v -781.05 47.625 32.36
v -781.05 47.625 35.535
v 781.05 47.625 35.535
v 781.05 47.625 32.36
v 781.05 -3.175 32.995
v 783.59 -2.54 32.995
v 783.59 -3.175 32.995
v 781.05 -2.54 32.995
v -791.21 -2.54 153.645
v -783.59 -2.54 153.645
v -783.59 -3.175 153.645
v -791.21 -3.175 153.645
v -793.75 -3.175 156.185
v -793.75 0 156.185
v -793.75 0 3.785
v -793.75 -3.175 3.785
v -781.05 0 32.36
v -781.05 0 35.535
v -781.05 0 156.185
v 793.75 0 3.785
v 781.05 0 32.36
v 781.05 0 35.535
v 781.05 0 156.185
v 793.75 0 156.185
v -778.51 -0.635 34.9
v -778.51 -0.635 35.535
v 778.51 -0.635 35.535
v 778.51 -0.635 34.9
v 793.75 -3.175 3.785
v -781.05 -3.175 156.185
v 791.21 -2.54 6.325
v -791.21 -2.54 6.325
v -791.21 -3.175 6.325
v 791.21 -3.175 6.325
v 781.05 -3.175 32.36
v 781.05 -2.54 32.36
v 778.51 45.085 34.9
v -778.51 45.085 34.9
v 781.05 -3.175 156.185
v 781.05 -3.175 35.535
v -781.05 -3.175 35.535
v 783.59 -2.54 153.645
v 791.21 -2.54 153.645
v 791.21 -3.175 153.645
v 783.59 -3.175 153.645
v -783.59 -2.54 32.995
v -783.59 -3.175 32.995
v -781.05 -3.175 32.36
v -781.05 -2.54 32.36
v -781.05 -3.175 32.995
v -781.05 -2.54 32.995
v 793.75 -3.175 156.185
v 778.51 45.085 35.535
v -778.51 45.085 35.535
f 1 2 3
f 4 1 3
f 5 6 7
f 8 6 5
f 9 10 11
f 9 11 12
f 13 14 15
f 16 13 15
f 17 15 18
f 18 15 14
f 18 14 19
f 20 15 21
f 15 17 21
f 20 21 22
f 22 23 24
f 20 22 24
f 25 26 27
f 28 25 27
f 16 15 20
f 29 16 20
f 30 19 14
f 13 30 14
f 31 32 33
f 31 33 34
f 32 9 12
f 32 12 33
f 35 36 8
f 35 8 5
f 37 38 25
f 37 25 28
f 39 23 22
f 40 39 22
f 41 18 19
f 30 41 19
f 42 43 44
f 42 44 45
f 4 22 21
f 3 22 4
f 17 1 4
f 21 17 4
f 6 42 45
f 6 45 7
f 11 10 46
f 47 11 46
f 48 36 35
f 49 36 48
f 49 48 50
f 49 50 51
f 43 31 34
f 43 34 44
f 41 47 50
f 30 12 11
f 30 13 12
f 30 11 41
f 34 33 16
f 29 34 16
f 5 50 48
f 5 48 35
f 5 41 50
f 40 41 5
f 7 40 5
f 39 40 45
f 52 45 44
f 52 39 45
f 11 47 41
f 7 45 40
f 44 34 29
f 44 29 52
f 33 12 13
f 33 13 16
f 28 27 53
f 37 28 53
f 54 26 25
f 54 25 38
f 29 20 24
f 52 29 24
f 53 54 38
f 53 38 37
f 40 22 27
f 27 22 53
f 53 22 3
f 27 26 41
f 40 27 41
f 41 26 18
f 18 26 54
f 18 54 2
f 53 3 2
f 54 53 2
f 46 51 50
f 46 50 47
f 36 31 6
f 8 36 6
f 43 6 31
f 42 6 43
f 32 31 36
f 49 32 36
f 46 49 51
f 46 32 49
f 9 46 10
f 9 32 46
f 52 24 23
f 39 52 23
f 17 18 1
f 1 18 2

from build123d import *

# Parameters (mm, degrees)
F1_DEPTH     = 3.175
F3_W         = 1562.1
F3_H         = 50.8
F4_DEPTH     = 3.175
F5_T         = 2.54
F5_T3_DEPTH  = 8.255
F5_T5_DEPTH  = 1567.18
F6_T         = 2.54
F6_T3_DEPTH  = 8.255
F6_T5_DEPTH  = 8.255
F6_T7_DEPTH  = 1567.18
F6_T9_DEPTH  = 5.715
F6_T11_DEPTH = 50.165
F6_T13_DEPTH = 5.715
F6_T15_DEPTH = 1562.1


# Not quite as in the source:
# - a shell that OpenCascade refuses in one call is made with other operations: the cavity is built on its own and cut out


with BuildPart() as f1:
    # F0 (on Front) → F1 (new body)
    with BuildSketch(Plane.XZ):
        Polygon((-781.05, 156.1854919385), (-793.75, 156.1854919385), (-793.75, 3.7854919385), (793.75, 3.7854919385), (793.75, 156.1854919385), (781.05, 156.1854919385), (781.05, 35.5354919385), (-781.05, 35.5354919385), align=None)
    extrude(amount=F1_DEPTH)

    # F3 (on face) → F4 (join)
    with BuildSketch(Plane.XY.offset(35.5354919385)):
        with Locations((0, 22.225)):
            Rectangle(F3_W, F3_H)
    extrude(amount=-F4_DEPTH)

    # F5: shell of thickness 2.54, made by hand


with BuildPart() as f5_core1:
    # F5_t2: copy of F1
    add(f1.part)

    # the walls: a layer under each face that stays
    f5_faces = [f5_core1.faces().sort_by_distance(p)[0] for p in [
        (-781.05, -1.5875, 95.8604919385),
        (-787.4, -1.5875, 156.1854919385),
        (-529.1666666667, 0, 29.1854919385),
        (-529.1666666667, -3.175, 29.1854919385),
        (781.05, -1.5875, 95.8604919385),
        (-793.75, -1.5875, 79.9854919385),
        (-781.05, 23.8125, 33.9479919385),
        (0, 23.8125, 32.3604919385),
        (781.05, 23.8125, 33.9479919385),
        (787.4, -1.5875, 156.1854919385),
        (793.75, -1.5875, 79.9854919385),
        (0, -1.5875, 3.7854919385),
        (0, 47.625, 33.9479919385),
    ]]
    thicken(f5_faces, amount=-F5_T, mode=Mode.SUBTRACT)

    # F5_s4 → F5_t3 (cut)
    with BuildSketch(Plane.XY.offset(29.8204919385)):
        Polygon((-781.0754, 0.0254), (-781.05, -2.54), (-778.51, -2.54), (-778.51, 0), align=None)
        Polygon((781.0754, 0.0254), (781.05, -2.54), (778.51, -2.54), (778.51, 0), align=None)
    extrude(amount=F5_T3_DEPTH, mode=Mode.SUBTRACT)

    # F5_s6 → F5_t5 (cut)
    with BuildSketch(Plane.YZ.offset(-783.59)):
        Polygon((0.0254, 32.3350919385), (-2.54, 32.3604919385), (-2.54, 34.9004919385), (0, 34.9004919385), align=None)
    extrude(amount=F5_T5_DEPTH, mode=Mode.SUBTRACT)


with BuildPart() as f1_1:
    add(f1.part)

    # what is left inside the walls is the cavity
    f5_cavity = [f5_core1.part.solids().sort_by_distance(p)[0] for p in [
        (0, 14.605, 34.925892),
    ]]
    add(f5_cavity, mode=Mode.SUBTRACT)

    # F6: shell of thickness 2.54, made by hand


with BuildPart() as f6_core1:
    # F6_t2: copy of F1
    add(f1_1.part)

    # the walls: a layer under each face that stays
    f6_faces = [f6_core1.faces().sort_by_distance(p)[0] for p in [
        (-781.05, -1.5875, 95.8604919385),
        (728.98, -1.4816666667, 35.5354919385),
        (-787.4, -1.5875, 156.1854919385),
        (-529.1666666667, 0, 29.1854919385),
        (781.05, -1.5875, 95.8604919385),
        (781.05, 23.8125, 33.9479919385),
        (0, 47.625, 33.9479919385),
        (-781.05, 23.8125, 33.9479919385),
        (778.51, 22.225, 35.2179919385),
        (0, -0.635, 35.2179919385),
        (-778.51, 22.225, 35.2179919385),
        (0, 45.085, 35.2179919385),
        (-793.75, -1.5875, 79.9854919385),
        (0, 23.8125, 32.3604919385),
        (787.4, -1.5875, 156.1854919385),
        (793.75, -1.5875, 79.9854919385),
        (0, -1.5875, 3.7854919385),
        (0, 22.225, 34.9004919385),
    ]]
    thicken(f6_faces, amount=-F6_T, mode=Mode.SUBTRACT)

    # F6_s4 → F6_t3 (cut)
    with BuildSketch(Plane.XZ.offset(-2.54)):
        Polygon((-781.0246, 35.5608919385), (-783.59, 35.5354919385), (-783.59, 32.9954919385), (-781.05, 32.9954919385), align=None)
        Polygon((781.0246, 35.5608919385), (781.05, 32.9954919385), (783.59, 32.9954919385), (783.59, 35.5354919385), align=None)
    extrude(amount=F6_T3_DEPTH, mode=Mode.SUBTRACT)

    # F6_s6 → F6_t5 (cut)
    with BuildSketch(Plane.XY.offset(29.8204919385)):
        Polygon((-781.0754, 0.0254), (-781.05, -2.54), (-778.51, -2.54), (-778.51, 0), align=None)
        Polygon((781.0754, 0.0254), (781.05, -2.54), (778.51, -2.54), (778.51, 0), align=None)
    extrude(amount=F6_T5_DEPTH, mode=Mode.SUBTRACT)

    # F6_s8 → F6_t7 (cut)
    with BuildSketch(Plane.YZ.offset(-783.59)):
        Polygon((0.0254, 32.3350919385), (-2.54, 32.3604919385), (-2.54, 34.9004919385), (0, 34.9004919385), align=None)
    extrude(amount=F6_T7_DEPTH, mode=Mode.SUBTRACT)

    # F6_s10 → F6_t9 (cut)
    with BuildSketch(Plane.XY.offset(32.3604919385)):
        Polygon((778.4846, 45.0596), (781.05, 45.085), (781.05, 47.625), (778.51, 47.625), align=None)
        Polygon((778.4846, -0.6096), (781.05, -0.635), (781.05, -3.175), (778.51, -3.175), align=None)
        Polygon((-778.4846, -0.6096), (-778.51, -3.175), (-781.05, -3.175), (-781.05, -0.635), align=None)
        Polygon((-778.4846, 45.0596), (-781.05, 45.085), (-781.05, 47.625), (-778.51, 47.625), align=None)
    extrude(amount=F6_T9_DEPTH, mode=Mode.SUBTRACT)

    # F6_s12 → F6_t11 (cut)
    with BuildSketch(Plane.XZ.offset(-47.625)):
        Polygon((778.4846, 34.9258919385), (781.05, 34.9004919385), (781.05, 32.3604919385), (778.51, 32.3604919385), align=None)
        Polygon((-778.4846, 34.9258919385), (-781.05, 34.9004919385), (-781.05, 32.3604919385), (-778.51, 32.3604919385), align=None)
    extrude(amount=F6_T11_DEPTH, mode=Mode.SUBTRACT)

    # F6_s14 → F6_t13 (cut)
    with BuildSketch(Plane.XZ.offset(-2.54)):
        Polygon((778.4846, 34.9258919385), (781.05, 34.9004919385), (781.05, 32.3604919385), (778.51, 32.3604919385), align=None)
        Polygon((-778.4846, 34.9258919385), (-781.05, 34.9004919385), (-781.05, 32.3604919385), (-778.51, 32.3604919385), align=None)
    extrude(amount=F6_T13_DEPTH, mode=Mode.SUBTRACT)

    # F6_s16 → F6_t15 (cut)
    with BuildSketch(Plane.YZ.offset(-781.05)):
        Polygon((-0.6096, 34.9258919385), (-3.175, 34.9004919385), (-3.175, 32.3604919385), (-0.635, 32.3604919385), align=None)
        Polygon((45.0596, 34.9258919385), (47.625, 34.9004919385), (47.625, 32.3604919385), (45.085, 32.3604919385), align=None)
    extrude(amount=F6_T15_DEPTH, mode=Mode.SUBTRACT)


with BuildPart() as f1_2:
    add(f1_1.part)

    # what is left inside the walls is the cavity
    f6_cavity = [f6_core1.part.solids().sort_by_distance(p)[0] for p in [
        (395.605, -2.5654, 22.694381),
    ]]
    add(f6_cavity, mode=Mode.SUBTRACT)


solid = f1_2.part
